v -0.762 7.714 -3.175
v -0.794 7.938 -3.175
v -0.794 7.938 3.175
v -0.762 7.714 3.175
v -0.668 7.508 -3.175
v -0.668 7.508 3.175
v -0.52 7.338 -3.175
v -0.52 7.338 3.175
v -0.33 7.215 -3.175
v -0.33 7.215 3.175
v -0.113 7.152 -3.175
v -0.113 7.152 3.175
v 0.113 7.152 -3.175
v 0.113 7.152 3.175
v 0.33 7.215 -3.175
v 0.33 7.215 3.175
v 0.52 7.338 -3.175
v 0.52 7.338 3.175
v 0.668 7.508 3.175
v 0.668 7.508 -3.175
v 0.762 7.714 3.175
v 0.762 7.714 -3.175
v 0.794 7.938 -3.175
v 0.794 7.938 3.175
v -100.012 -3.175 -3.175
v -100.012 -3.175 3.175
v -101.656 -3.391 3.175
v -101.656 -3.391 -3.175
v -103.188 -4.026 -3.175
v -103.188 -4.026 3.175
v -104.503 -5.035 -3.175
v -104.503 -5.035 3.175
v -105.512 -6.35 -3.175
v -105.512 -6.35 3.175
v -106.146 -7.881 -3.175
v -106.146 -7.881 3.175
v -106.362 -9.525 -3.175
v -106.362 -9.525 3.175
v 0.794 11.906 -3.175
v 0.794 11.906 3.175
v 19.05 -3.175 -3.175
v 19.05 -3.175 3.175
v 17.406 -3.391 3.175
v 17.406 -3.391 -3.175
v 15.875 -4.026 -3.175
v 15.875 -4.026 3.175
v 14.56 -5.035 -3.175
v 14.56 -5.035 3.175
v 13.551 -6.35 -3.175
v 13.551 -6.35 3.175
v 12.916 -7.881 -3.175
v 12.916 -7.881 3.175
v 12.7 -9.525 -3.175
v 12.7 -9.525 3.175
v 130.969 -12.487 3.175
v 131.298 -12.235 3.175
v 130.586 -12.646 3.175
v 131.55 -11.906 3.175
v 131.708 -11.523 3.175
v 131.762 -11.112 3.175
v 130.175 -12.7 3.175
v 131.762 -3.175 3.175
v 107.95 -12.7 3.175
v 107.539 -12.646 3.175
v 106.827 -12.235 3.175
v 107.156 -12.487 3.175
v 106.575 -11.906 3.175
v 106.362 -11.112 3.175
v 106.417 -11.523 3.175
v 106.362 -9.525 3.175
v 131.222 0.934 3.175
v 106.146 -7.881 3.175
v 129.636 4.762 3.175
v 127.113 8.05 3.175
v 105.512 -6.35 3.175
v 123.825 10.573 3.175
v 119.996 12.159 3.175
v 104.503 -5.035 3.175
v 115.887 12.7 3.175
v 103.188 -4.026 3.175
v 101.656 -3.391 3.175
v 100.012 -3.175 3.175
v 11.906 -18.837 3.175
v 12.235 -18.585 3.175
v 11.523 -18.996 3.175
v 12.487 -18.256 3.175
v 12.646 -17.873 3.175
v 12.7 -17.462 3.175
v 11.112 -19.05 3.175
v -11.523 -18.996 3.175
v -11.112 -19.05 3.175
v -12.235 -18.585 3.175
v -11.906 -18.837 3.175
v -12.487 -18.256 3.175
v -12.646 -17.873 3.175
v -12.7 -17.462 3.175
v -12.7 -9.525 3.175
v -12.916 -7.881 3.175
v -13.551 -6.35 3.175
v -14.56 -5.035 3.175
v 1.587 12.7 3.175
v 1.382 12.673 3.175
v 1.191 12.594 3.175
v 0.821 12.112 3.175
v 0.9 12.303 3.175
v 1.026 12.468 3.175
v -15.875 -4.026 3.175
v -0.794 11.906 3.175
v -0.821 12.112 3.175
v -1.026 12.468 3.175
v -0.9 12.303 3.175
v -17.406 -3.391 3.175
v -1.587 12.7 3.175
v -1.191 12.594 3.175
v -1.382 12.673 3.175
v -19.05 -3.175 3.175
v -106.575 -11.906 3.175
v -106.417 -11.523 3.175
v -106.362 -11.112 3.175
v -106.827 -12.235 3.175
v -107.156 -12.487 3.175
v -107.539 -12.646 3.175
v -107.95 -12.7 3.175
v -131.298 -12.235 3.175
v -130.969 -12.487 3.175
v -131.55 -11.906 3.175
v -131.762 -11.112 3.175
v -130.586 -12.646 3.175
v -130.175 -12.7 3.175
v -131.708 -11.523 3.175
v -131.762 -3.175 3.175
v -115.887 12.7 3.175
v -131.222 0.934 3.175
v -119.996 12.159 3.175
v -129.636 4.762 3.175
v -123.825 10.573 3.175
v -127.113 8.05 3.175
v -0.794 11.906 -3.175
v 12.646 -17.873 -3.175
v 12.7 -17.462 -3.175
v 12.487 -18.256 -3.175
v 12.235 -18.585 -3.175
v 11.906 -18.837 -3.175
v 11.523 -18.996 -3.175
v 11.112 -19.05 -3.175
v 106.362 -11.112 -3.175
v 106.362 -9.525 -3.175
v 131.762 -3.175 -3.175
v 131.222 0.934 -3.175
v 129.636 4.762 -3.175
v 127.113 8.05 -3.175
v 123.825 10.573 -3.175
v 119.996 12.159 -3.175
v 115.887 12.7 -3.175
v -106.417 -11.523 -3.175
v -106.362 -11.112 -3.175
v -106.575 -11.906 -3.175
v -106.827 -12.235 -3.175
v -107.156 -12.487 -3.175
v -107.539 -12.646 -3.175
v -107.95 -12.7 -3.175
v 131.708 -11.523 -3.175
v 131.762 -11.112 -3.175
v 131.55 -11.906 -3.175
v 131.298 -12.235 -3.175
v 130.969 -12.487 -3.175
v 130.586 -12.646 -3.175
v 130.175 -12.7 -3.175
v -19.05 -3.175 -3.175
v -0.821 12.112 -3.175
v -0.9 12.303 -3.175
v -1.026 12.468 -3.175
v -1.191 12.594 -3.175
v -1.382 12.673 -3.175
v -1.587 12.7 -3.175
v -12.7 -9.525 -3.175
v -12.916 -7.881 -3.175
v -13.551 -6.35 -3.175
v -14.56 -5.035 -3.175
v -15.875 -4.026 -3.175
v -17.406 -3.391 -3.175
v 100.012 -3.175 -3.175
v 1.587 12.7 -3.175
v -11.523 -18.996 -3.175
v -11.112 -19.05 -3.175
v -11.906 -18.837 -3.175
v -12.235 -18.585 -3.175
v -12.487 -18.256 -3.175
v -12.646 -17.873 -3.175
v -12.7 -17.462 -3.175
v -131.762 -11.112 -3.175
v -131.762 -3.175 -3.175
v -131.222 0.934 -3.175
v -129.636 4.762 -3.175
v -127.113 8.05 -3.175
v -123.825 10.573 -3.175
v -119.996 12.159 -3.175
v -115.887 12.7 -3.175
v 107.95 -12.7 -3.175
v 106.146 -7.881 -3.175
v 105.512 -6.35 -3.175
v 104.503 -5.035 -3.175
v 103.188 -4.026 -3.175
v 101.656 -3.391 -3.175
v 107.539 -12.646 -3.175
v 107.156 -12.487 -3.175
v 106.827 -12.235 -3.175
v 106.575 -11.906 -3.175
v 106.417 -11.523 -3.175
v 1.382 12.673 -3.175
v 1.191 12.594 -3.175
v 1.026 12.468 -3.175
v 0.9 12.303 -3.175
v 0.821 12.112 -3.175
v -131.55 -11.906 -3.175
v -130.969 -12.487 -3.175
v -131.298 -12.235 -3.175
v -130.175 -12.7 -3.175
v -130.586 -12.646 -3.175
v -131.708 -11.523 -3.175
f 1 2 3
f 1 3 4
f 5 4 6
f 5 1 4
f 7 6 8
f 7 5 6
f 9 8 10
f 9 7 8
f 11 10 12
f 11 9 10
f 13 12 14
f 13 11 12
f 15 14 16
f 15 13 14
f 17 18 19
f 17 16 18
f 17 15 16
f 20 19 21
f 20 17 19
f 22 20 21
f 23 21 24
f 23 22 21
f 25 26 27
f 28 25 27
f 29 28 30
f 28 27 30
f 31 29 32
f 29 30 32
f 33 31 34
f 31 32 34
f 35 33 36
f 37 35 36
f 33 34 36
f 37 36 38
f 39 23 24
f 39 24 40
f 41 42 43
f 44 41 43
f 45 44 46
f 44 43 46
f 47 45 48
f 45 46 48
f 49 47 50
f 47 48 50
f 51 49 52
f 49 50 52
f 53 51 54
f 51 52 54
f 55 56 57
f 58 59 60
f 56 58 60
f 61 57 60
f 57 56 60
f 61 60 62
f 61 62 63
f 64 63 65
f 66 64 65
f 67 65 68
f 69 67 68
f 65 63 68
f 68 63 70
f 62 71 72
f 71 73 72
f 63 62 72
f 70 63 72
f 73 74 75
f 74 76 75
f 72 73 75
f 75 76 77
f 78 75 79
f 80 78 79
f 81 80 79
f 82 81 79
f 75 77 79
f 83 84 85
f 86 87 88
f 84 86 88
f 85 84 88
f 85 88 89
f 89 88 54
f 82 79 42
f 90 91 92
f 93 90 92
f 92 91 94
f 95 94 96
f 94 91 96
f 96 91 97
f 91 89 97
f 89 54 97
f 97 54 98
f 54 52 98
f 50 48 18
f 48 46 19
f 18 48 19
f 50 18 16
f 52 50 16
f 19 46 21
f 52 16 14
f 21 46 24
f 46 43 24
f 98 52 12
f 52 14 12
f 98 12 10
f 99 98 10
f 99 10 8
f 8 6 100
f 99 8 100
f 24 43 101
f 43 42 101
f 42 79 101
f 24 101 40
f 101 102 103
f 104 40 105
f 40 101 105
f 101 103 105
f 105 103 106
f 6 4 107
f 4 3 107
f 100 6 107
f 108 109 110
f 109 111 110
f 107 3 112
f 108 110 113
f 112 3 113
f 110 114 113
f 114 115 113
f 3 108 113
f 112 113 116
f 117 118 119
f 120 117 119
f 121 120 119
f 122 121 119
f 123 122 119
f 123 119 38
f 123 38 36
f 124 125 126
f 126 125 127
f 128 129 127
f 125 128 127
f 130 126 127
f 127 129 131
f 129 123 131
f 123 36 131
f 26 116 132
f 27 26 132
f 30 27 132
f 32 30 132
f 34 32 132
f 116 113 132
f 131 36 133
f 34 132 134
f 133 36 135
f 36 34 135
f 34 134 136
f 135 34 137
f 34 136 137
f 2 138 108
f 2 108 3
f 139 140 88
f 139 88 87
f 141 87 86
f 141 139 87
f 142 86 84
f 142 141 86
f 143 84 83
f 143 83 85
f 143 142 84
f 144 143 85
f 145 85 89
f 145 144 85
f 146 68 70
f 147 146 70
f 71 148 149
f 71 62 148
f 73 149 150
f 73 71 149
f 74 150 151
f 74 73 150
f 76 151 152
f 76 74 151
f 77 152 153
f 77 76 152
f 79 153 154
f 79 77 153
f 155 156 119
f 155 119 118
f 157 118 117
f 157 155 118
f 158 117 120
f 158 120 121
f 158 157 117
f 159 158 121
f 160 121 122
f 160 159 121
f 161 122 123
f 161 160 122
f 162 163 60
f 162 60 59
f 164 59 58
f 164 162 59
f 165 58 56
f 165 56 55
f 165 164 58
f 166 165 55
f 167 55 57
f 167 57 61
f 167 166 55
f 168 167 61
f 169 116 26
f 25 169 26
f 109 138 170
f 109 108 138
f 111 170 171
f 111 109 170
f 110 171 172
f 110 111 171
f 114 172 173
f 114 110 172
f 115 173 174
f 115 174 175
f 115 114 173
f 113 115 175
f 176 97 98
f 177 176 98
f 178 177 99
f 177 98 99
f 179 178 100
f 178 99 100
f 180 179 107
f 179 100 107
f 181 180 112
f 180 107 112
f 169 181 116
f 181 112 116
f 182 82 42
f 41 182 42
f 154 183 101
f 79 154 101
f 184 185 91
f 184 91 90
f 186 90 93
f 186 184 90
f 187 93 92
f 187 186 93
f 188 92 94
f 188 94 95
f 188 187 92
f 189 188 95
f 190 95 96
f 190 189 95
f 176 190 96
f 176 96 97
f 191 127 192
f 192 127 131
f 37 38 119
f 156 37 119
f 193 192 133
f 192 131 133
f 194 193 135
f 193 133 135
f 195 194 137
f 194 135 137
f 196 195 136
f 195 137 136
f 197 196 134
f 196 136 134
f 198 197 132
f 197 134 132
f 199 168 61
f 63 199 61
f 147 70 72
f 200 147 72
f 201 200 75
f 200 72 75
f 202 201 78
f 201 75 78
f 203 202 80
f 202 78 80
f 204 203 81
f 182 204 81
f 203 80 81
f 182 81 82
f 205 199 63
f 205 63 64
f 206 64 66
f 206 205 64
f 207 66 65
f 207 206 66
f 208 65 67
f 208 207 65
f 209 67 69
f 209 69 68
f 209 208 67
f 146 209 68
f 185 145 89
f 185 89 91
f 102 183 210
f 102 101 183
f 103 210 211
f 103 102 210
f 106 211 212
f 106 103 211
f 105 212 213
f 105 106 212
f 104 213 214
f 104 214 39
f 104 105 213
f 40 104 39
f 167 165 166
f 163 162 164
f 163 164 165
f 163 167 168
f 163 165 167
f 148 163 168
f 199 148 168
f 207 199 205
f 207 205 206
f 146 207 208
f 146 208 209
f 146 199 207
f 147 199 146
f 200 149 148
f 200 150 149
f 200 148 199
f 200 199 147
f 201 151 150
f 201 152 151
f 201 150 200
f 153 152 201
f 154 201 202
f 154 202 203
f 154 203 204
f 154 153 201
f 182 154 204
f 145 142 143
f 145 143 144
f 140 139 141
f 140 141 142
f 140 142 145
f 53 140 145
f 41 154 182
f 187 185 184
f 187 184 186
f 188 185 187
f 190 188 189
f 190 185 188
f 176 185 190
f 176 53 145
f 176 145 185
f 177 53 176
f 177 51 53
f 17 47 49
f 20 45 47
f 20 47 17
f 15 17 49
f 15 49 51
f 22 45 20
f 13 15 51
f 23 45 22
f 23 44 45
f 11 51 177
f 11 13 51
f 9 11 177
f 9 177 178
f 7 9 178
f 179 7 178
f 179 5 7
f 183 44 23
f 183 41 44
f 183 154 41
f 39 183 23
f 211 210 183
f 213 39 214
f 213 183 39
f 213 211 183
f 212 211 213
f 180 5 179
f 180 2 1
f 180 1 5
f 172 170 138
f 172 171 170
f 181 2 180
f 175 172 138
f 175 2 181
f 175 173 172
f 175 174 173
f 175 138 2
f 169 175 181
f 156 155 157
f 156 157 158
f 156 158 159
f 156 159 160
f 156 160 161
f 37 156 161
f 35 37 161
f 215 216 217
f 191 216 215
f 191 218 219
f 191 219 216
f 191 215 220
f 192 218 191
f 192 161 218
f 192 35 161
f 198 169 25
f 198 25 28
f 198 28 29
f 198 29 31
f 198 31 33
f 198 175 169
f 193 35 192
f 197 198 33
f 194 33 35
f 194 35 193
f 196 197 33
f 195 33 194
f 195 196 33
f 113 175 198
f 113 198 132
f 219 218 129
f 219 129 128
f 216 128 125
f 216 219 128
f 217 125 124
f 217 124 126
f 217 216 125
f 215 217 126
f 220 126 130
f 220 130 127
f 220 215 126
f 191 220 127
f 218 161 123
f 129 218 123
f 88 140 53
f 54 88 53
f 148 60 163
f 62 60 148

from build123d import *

# Parameters (mm, degrees)
SKETCH1_W           = 25.4
SKETCH1_H           = 6.35
EXTRUDE1_DEPTH      = 131.7625
EXTRUDE2_REACH      = 134.525
FILLET1_R           = 15.875
SKETCH3_W           = 25.4
SKETCH3_H           = 6.35
TAB1_DEPTH          = 6.35
BREAK_CORNER1_START = -3.175
BREAK_CORNER1_DEPTH = 6.35
CUT_EXTRUDE1_REACH  = 135.284
FILLET2_R           = 0.79375


# Read off the part's stored shape, not the designer's step: Break-Corner1
# Sheet-metal steps are written as plain solids
with BuildPart() as part:
    # Sketch1 → Extrude1 (new, symmetric)
    with BuildSketch(Plane.YZ):
        Rectangle(SKETCH1_W, SKETCH1_H)
    extrude(amount=EXTRUDE1_DEPTH, both=True)

    # Sketch2 → Extrude2 (cut, up to next)
    with BuildSketch(Plane.XY.offset(3.175), mode=Mode.PRIVATE) as extrude2_sk1:
        with BuildLine():
            Line((-106.3625, -12.7), (-12.7, -12.7))
            Line((-12.7, -12.7), (-12.7, -9.525))
            ThreePointArc((-12.7, -9.525), (-14.559871939, -5.034871939), (-19.05, -3.175))
            Line((-19.05, -3.175), (-100.0125, -3.175))
            ThreePointArc((-100.0125, -3.175), (-104.502628061, -5.034871939), (-106.3625, -9.525))
            Line((-106.3625, -9.525), (-106.3625, -12.7))
        make_face()
    extrude2_tool1 = extrude(extrude2_sk1.sketch, amount=-EXTRUDE2_REACH, mode=Mode.PRIVATE) & part.part
    # Sketch2 → Extrude2 (cut, up to next)
    with BuildSketch(Plane.XY.offset(3.175), mode=Mode.PRIVATE) as extrude2_sk2:
        with BuildLine():
            Line((12.7, -12.7), (106.3625, -12.7))
            Line((106.3625, -12.7), (106.3625, -9.525))
            ThreePointArc((106.3625, -9.525), (104.502628061, -5.034871939), (100.0125, -3.175))
            Line((100.0125, -3.175), (19.05, -3.175))
            ThreePointArc((19.05, -3.175), (14.559871939, -5.034871939), (12.7, -9.525))
            Line((12.7, -9.525), (12.7, -12.7))
        make_face()
    extrude2_tool2 = extrude(extrude2_sk2.sketch, amount=-EXTRUDE2_REACH, mode=Mode.PRIVATE) & part.part
    add(extrude2_tool1.solids().sort_by_distance((-59.53125, -8.003656, 3.175))[0], mode=Mode.SUBTRACT)
    add(extrude2_tool2.solids().sort_by_distance((59.53125, -8.003656, 3.175))[0], mode=Mode.SUBTRACT)

    # Fillet1
    fillet1_edges = [part.edges().sort_by_distance(p)[0] for p in [
        (131.7625, 12.7, 0),
        (-131.7625, 12.7, 0),
    ]]
    fillet(fillet1_edges, radius=FILLET1_R)

    # Sketch3 → Tab1 (add)
    with BuildSketch(Plane(origin=(0, 0, -3.175), x_dir=(-1, 0, 0), z_dir=(0, 0, -1))):
        with Locations((0, -15.875)):
            Rectangle(SKETCH3_W, SKETCH3_H)
    extrude(amount=-TAB1_DEPTH)

    # Break-Corner1 outline → Break-Corner1 (cut)
    with BuildSketch(Plane.XY.offset(BREAK_CORNER1_START)):
        with BuildLine():
            Line((-131.7625, -12.7), (-130.175, -12.7))
            ThreePointArc((-130.175, -12.7), (-131.297532015, -12.235032015), (-131.7625, -11.1125))
            Line((-131.7625, -11.1125), (-131.7625, -12.7))
        make_face()
        with BuildLine():
            ThreePointArc((-106.3625, -11.1125), (-106.827467985, -12.235032015), (-107.95, -12.7))
            Line((-107.95, -12.7), (-106.3625, -12.7))
            Line((-106.3625, -12.7), (-106.3625, -11.1125))
        make_face()
        with BuildLine():
            ThreePointArc((12.7, -17.4625), (12.235032015, -18.585032015), (11.1125, -19.05))
            Line((11.1125, -19.05), (12.7, -19.05))
            Line((12.7, -19.05), (12.7, -17.4625))
        make_face()
        with BuildLine():
            ThreePointArc((-11.1125, -19.05), (-12.235032015, -18.585032015), (-12.7, -17.4625))
            Line((-12.7, -17.4625), (-12.7, -19.05))
            Line((-12.7, -19.05), (-11.1125, -19.05))
        make_face()
        with BuildLine():
            Line((106.3625, -12.7), (107.95, -12.7))
            ThreePointArc((107.95, -12.7), (106.827467985, -12.235032015), (106.3625, -11.1125))
            Line((106.3625, -11.1125), (106.3625, -12.7))
        make_face()
        with BuildLine():
            ThreePointArc((131.7625, -11.1125), (131.297532015, -12.235032015), (130.175, -12.7))
            Line((130.175, -12.7), (131.7625, -12.7))
            Line((131.7625, -12.7), (131.7625, -11.1125))
        make_face()
    extrude(amount=BREAK_CORNER1_DEPTH, mode=Mode.SUBTRACT)

    # Sketch4 → Cut-Extrude1 (cut, up to next)
    with BuildSketch(Plane(origin=(0, 0, -3.175), x_dir=(-1, 0, 0), z_dir=(0, 0, -1)), mode=Mode.PRIVATE) as cut_extrude1_sk1:
        with BuildLine():
            Line((0.79375, 12.7), (0.79375, 7.9375))
            ThreePointArc((0.79375, 7.9375), (0, 7.14375), (-0.79375, 7.9375))
            Line((-0.79375, 7.9375), (-0.79375, 12.7))
            ThreePointArc((-0.79375, 12.7), (0, 13.49375), (0.79375, 12.7))
        make_face()
    cut_extrude1_tool1 = extrude(cut_extrude1_sk1.sketch, amount=-CUT_EXTRUDE1_REACH, mode=Mode.PRIVATE) & part.part
    add(cut_extrude1_tool1.solids().sort_by_distance((0, 10.31875, -3.175))[0], mode=Mode.SUBTRACT)

    # Fillet2
    fillet2_edges = [part.edges().sort_by_distance(p)[0] for p in [
        (-0.79375, 12.7, 0),
        (0.79375, 12.7, 0),
    ]]
    fillet(fillet2_edges, radius=FILLET2_R)


solid = part.part
